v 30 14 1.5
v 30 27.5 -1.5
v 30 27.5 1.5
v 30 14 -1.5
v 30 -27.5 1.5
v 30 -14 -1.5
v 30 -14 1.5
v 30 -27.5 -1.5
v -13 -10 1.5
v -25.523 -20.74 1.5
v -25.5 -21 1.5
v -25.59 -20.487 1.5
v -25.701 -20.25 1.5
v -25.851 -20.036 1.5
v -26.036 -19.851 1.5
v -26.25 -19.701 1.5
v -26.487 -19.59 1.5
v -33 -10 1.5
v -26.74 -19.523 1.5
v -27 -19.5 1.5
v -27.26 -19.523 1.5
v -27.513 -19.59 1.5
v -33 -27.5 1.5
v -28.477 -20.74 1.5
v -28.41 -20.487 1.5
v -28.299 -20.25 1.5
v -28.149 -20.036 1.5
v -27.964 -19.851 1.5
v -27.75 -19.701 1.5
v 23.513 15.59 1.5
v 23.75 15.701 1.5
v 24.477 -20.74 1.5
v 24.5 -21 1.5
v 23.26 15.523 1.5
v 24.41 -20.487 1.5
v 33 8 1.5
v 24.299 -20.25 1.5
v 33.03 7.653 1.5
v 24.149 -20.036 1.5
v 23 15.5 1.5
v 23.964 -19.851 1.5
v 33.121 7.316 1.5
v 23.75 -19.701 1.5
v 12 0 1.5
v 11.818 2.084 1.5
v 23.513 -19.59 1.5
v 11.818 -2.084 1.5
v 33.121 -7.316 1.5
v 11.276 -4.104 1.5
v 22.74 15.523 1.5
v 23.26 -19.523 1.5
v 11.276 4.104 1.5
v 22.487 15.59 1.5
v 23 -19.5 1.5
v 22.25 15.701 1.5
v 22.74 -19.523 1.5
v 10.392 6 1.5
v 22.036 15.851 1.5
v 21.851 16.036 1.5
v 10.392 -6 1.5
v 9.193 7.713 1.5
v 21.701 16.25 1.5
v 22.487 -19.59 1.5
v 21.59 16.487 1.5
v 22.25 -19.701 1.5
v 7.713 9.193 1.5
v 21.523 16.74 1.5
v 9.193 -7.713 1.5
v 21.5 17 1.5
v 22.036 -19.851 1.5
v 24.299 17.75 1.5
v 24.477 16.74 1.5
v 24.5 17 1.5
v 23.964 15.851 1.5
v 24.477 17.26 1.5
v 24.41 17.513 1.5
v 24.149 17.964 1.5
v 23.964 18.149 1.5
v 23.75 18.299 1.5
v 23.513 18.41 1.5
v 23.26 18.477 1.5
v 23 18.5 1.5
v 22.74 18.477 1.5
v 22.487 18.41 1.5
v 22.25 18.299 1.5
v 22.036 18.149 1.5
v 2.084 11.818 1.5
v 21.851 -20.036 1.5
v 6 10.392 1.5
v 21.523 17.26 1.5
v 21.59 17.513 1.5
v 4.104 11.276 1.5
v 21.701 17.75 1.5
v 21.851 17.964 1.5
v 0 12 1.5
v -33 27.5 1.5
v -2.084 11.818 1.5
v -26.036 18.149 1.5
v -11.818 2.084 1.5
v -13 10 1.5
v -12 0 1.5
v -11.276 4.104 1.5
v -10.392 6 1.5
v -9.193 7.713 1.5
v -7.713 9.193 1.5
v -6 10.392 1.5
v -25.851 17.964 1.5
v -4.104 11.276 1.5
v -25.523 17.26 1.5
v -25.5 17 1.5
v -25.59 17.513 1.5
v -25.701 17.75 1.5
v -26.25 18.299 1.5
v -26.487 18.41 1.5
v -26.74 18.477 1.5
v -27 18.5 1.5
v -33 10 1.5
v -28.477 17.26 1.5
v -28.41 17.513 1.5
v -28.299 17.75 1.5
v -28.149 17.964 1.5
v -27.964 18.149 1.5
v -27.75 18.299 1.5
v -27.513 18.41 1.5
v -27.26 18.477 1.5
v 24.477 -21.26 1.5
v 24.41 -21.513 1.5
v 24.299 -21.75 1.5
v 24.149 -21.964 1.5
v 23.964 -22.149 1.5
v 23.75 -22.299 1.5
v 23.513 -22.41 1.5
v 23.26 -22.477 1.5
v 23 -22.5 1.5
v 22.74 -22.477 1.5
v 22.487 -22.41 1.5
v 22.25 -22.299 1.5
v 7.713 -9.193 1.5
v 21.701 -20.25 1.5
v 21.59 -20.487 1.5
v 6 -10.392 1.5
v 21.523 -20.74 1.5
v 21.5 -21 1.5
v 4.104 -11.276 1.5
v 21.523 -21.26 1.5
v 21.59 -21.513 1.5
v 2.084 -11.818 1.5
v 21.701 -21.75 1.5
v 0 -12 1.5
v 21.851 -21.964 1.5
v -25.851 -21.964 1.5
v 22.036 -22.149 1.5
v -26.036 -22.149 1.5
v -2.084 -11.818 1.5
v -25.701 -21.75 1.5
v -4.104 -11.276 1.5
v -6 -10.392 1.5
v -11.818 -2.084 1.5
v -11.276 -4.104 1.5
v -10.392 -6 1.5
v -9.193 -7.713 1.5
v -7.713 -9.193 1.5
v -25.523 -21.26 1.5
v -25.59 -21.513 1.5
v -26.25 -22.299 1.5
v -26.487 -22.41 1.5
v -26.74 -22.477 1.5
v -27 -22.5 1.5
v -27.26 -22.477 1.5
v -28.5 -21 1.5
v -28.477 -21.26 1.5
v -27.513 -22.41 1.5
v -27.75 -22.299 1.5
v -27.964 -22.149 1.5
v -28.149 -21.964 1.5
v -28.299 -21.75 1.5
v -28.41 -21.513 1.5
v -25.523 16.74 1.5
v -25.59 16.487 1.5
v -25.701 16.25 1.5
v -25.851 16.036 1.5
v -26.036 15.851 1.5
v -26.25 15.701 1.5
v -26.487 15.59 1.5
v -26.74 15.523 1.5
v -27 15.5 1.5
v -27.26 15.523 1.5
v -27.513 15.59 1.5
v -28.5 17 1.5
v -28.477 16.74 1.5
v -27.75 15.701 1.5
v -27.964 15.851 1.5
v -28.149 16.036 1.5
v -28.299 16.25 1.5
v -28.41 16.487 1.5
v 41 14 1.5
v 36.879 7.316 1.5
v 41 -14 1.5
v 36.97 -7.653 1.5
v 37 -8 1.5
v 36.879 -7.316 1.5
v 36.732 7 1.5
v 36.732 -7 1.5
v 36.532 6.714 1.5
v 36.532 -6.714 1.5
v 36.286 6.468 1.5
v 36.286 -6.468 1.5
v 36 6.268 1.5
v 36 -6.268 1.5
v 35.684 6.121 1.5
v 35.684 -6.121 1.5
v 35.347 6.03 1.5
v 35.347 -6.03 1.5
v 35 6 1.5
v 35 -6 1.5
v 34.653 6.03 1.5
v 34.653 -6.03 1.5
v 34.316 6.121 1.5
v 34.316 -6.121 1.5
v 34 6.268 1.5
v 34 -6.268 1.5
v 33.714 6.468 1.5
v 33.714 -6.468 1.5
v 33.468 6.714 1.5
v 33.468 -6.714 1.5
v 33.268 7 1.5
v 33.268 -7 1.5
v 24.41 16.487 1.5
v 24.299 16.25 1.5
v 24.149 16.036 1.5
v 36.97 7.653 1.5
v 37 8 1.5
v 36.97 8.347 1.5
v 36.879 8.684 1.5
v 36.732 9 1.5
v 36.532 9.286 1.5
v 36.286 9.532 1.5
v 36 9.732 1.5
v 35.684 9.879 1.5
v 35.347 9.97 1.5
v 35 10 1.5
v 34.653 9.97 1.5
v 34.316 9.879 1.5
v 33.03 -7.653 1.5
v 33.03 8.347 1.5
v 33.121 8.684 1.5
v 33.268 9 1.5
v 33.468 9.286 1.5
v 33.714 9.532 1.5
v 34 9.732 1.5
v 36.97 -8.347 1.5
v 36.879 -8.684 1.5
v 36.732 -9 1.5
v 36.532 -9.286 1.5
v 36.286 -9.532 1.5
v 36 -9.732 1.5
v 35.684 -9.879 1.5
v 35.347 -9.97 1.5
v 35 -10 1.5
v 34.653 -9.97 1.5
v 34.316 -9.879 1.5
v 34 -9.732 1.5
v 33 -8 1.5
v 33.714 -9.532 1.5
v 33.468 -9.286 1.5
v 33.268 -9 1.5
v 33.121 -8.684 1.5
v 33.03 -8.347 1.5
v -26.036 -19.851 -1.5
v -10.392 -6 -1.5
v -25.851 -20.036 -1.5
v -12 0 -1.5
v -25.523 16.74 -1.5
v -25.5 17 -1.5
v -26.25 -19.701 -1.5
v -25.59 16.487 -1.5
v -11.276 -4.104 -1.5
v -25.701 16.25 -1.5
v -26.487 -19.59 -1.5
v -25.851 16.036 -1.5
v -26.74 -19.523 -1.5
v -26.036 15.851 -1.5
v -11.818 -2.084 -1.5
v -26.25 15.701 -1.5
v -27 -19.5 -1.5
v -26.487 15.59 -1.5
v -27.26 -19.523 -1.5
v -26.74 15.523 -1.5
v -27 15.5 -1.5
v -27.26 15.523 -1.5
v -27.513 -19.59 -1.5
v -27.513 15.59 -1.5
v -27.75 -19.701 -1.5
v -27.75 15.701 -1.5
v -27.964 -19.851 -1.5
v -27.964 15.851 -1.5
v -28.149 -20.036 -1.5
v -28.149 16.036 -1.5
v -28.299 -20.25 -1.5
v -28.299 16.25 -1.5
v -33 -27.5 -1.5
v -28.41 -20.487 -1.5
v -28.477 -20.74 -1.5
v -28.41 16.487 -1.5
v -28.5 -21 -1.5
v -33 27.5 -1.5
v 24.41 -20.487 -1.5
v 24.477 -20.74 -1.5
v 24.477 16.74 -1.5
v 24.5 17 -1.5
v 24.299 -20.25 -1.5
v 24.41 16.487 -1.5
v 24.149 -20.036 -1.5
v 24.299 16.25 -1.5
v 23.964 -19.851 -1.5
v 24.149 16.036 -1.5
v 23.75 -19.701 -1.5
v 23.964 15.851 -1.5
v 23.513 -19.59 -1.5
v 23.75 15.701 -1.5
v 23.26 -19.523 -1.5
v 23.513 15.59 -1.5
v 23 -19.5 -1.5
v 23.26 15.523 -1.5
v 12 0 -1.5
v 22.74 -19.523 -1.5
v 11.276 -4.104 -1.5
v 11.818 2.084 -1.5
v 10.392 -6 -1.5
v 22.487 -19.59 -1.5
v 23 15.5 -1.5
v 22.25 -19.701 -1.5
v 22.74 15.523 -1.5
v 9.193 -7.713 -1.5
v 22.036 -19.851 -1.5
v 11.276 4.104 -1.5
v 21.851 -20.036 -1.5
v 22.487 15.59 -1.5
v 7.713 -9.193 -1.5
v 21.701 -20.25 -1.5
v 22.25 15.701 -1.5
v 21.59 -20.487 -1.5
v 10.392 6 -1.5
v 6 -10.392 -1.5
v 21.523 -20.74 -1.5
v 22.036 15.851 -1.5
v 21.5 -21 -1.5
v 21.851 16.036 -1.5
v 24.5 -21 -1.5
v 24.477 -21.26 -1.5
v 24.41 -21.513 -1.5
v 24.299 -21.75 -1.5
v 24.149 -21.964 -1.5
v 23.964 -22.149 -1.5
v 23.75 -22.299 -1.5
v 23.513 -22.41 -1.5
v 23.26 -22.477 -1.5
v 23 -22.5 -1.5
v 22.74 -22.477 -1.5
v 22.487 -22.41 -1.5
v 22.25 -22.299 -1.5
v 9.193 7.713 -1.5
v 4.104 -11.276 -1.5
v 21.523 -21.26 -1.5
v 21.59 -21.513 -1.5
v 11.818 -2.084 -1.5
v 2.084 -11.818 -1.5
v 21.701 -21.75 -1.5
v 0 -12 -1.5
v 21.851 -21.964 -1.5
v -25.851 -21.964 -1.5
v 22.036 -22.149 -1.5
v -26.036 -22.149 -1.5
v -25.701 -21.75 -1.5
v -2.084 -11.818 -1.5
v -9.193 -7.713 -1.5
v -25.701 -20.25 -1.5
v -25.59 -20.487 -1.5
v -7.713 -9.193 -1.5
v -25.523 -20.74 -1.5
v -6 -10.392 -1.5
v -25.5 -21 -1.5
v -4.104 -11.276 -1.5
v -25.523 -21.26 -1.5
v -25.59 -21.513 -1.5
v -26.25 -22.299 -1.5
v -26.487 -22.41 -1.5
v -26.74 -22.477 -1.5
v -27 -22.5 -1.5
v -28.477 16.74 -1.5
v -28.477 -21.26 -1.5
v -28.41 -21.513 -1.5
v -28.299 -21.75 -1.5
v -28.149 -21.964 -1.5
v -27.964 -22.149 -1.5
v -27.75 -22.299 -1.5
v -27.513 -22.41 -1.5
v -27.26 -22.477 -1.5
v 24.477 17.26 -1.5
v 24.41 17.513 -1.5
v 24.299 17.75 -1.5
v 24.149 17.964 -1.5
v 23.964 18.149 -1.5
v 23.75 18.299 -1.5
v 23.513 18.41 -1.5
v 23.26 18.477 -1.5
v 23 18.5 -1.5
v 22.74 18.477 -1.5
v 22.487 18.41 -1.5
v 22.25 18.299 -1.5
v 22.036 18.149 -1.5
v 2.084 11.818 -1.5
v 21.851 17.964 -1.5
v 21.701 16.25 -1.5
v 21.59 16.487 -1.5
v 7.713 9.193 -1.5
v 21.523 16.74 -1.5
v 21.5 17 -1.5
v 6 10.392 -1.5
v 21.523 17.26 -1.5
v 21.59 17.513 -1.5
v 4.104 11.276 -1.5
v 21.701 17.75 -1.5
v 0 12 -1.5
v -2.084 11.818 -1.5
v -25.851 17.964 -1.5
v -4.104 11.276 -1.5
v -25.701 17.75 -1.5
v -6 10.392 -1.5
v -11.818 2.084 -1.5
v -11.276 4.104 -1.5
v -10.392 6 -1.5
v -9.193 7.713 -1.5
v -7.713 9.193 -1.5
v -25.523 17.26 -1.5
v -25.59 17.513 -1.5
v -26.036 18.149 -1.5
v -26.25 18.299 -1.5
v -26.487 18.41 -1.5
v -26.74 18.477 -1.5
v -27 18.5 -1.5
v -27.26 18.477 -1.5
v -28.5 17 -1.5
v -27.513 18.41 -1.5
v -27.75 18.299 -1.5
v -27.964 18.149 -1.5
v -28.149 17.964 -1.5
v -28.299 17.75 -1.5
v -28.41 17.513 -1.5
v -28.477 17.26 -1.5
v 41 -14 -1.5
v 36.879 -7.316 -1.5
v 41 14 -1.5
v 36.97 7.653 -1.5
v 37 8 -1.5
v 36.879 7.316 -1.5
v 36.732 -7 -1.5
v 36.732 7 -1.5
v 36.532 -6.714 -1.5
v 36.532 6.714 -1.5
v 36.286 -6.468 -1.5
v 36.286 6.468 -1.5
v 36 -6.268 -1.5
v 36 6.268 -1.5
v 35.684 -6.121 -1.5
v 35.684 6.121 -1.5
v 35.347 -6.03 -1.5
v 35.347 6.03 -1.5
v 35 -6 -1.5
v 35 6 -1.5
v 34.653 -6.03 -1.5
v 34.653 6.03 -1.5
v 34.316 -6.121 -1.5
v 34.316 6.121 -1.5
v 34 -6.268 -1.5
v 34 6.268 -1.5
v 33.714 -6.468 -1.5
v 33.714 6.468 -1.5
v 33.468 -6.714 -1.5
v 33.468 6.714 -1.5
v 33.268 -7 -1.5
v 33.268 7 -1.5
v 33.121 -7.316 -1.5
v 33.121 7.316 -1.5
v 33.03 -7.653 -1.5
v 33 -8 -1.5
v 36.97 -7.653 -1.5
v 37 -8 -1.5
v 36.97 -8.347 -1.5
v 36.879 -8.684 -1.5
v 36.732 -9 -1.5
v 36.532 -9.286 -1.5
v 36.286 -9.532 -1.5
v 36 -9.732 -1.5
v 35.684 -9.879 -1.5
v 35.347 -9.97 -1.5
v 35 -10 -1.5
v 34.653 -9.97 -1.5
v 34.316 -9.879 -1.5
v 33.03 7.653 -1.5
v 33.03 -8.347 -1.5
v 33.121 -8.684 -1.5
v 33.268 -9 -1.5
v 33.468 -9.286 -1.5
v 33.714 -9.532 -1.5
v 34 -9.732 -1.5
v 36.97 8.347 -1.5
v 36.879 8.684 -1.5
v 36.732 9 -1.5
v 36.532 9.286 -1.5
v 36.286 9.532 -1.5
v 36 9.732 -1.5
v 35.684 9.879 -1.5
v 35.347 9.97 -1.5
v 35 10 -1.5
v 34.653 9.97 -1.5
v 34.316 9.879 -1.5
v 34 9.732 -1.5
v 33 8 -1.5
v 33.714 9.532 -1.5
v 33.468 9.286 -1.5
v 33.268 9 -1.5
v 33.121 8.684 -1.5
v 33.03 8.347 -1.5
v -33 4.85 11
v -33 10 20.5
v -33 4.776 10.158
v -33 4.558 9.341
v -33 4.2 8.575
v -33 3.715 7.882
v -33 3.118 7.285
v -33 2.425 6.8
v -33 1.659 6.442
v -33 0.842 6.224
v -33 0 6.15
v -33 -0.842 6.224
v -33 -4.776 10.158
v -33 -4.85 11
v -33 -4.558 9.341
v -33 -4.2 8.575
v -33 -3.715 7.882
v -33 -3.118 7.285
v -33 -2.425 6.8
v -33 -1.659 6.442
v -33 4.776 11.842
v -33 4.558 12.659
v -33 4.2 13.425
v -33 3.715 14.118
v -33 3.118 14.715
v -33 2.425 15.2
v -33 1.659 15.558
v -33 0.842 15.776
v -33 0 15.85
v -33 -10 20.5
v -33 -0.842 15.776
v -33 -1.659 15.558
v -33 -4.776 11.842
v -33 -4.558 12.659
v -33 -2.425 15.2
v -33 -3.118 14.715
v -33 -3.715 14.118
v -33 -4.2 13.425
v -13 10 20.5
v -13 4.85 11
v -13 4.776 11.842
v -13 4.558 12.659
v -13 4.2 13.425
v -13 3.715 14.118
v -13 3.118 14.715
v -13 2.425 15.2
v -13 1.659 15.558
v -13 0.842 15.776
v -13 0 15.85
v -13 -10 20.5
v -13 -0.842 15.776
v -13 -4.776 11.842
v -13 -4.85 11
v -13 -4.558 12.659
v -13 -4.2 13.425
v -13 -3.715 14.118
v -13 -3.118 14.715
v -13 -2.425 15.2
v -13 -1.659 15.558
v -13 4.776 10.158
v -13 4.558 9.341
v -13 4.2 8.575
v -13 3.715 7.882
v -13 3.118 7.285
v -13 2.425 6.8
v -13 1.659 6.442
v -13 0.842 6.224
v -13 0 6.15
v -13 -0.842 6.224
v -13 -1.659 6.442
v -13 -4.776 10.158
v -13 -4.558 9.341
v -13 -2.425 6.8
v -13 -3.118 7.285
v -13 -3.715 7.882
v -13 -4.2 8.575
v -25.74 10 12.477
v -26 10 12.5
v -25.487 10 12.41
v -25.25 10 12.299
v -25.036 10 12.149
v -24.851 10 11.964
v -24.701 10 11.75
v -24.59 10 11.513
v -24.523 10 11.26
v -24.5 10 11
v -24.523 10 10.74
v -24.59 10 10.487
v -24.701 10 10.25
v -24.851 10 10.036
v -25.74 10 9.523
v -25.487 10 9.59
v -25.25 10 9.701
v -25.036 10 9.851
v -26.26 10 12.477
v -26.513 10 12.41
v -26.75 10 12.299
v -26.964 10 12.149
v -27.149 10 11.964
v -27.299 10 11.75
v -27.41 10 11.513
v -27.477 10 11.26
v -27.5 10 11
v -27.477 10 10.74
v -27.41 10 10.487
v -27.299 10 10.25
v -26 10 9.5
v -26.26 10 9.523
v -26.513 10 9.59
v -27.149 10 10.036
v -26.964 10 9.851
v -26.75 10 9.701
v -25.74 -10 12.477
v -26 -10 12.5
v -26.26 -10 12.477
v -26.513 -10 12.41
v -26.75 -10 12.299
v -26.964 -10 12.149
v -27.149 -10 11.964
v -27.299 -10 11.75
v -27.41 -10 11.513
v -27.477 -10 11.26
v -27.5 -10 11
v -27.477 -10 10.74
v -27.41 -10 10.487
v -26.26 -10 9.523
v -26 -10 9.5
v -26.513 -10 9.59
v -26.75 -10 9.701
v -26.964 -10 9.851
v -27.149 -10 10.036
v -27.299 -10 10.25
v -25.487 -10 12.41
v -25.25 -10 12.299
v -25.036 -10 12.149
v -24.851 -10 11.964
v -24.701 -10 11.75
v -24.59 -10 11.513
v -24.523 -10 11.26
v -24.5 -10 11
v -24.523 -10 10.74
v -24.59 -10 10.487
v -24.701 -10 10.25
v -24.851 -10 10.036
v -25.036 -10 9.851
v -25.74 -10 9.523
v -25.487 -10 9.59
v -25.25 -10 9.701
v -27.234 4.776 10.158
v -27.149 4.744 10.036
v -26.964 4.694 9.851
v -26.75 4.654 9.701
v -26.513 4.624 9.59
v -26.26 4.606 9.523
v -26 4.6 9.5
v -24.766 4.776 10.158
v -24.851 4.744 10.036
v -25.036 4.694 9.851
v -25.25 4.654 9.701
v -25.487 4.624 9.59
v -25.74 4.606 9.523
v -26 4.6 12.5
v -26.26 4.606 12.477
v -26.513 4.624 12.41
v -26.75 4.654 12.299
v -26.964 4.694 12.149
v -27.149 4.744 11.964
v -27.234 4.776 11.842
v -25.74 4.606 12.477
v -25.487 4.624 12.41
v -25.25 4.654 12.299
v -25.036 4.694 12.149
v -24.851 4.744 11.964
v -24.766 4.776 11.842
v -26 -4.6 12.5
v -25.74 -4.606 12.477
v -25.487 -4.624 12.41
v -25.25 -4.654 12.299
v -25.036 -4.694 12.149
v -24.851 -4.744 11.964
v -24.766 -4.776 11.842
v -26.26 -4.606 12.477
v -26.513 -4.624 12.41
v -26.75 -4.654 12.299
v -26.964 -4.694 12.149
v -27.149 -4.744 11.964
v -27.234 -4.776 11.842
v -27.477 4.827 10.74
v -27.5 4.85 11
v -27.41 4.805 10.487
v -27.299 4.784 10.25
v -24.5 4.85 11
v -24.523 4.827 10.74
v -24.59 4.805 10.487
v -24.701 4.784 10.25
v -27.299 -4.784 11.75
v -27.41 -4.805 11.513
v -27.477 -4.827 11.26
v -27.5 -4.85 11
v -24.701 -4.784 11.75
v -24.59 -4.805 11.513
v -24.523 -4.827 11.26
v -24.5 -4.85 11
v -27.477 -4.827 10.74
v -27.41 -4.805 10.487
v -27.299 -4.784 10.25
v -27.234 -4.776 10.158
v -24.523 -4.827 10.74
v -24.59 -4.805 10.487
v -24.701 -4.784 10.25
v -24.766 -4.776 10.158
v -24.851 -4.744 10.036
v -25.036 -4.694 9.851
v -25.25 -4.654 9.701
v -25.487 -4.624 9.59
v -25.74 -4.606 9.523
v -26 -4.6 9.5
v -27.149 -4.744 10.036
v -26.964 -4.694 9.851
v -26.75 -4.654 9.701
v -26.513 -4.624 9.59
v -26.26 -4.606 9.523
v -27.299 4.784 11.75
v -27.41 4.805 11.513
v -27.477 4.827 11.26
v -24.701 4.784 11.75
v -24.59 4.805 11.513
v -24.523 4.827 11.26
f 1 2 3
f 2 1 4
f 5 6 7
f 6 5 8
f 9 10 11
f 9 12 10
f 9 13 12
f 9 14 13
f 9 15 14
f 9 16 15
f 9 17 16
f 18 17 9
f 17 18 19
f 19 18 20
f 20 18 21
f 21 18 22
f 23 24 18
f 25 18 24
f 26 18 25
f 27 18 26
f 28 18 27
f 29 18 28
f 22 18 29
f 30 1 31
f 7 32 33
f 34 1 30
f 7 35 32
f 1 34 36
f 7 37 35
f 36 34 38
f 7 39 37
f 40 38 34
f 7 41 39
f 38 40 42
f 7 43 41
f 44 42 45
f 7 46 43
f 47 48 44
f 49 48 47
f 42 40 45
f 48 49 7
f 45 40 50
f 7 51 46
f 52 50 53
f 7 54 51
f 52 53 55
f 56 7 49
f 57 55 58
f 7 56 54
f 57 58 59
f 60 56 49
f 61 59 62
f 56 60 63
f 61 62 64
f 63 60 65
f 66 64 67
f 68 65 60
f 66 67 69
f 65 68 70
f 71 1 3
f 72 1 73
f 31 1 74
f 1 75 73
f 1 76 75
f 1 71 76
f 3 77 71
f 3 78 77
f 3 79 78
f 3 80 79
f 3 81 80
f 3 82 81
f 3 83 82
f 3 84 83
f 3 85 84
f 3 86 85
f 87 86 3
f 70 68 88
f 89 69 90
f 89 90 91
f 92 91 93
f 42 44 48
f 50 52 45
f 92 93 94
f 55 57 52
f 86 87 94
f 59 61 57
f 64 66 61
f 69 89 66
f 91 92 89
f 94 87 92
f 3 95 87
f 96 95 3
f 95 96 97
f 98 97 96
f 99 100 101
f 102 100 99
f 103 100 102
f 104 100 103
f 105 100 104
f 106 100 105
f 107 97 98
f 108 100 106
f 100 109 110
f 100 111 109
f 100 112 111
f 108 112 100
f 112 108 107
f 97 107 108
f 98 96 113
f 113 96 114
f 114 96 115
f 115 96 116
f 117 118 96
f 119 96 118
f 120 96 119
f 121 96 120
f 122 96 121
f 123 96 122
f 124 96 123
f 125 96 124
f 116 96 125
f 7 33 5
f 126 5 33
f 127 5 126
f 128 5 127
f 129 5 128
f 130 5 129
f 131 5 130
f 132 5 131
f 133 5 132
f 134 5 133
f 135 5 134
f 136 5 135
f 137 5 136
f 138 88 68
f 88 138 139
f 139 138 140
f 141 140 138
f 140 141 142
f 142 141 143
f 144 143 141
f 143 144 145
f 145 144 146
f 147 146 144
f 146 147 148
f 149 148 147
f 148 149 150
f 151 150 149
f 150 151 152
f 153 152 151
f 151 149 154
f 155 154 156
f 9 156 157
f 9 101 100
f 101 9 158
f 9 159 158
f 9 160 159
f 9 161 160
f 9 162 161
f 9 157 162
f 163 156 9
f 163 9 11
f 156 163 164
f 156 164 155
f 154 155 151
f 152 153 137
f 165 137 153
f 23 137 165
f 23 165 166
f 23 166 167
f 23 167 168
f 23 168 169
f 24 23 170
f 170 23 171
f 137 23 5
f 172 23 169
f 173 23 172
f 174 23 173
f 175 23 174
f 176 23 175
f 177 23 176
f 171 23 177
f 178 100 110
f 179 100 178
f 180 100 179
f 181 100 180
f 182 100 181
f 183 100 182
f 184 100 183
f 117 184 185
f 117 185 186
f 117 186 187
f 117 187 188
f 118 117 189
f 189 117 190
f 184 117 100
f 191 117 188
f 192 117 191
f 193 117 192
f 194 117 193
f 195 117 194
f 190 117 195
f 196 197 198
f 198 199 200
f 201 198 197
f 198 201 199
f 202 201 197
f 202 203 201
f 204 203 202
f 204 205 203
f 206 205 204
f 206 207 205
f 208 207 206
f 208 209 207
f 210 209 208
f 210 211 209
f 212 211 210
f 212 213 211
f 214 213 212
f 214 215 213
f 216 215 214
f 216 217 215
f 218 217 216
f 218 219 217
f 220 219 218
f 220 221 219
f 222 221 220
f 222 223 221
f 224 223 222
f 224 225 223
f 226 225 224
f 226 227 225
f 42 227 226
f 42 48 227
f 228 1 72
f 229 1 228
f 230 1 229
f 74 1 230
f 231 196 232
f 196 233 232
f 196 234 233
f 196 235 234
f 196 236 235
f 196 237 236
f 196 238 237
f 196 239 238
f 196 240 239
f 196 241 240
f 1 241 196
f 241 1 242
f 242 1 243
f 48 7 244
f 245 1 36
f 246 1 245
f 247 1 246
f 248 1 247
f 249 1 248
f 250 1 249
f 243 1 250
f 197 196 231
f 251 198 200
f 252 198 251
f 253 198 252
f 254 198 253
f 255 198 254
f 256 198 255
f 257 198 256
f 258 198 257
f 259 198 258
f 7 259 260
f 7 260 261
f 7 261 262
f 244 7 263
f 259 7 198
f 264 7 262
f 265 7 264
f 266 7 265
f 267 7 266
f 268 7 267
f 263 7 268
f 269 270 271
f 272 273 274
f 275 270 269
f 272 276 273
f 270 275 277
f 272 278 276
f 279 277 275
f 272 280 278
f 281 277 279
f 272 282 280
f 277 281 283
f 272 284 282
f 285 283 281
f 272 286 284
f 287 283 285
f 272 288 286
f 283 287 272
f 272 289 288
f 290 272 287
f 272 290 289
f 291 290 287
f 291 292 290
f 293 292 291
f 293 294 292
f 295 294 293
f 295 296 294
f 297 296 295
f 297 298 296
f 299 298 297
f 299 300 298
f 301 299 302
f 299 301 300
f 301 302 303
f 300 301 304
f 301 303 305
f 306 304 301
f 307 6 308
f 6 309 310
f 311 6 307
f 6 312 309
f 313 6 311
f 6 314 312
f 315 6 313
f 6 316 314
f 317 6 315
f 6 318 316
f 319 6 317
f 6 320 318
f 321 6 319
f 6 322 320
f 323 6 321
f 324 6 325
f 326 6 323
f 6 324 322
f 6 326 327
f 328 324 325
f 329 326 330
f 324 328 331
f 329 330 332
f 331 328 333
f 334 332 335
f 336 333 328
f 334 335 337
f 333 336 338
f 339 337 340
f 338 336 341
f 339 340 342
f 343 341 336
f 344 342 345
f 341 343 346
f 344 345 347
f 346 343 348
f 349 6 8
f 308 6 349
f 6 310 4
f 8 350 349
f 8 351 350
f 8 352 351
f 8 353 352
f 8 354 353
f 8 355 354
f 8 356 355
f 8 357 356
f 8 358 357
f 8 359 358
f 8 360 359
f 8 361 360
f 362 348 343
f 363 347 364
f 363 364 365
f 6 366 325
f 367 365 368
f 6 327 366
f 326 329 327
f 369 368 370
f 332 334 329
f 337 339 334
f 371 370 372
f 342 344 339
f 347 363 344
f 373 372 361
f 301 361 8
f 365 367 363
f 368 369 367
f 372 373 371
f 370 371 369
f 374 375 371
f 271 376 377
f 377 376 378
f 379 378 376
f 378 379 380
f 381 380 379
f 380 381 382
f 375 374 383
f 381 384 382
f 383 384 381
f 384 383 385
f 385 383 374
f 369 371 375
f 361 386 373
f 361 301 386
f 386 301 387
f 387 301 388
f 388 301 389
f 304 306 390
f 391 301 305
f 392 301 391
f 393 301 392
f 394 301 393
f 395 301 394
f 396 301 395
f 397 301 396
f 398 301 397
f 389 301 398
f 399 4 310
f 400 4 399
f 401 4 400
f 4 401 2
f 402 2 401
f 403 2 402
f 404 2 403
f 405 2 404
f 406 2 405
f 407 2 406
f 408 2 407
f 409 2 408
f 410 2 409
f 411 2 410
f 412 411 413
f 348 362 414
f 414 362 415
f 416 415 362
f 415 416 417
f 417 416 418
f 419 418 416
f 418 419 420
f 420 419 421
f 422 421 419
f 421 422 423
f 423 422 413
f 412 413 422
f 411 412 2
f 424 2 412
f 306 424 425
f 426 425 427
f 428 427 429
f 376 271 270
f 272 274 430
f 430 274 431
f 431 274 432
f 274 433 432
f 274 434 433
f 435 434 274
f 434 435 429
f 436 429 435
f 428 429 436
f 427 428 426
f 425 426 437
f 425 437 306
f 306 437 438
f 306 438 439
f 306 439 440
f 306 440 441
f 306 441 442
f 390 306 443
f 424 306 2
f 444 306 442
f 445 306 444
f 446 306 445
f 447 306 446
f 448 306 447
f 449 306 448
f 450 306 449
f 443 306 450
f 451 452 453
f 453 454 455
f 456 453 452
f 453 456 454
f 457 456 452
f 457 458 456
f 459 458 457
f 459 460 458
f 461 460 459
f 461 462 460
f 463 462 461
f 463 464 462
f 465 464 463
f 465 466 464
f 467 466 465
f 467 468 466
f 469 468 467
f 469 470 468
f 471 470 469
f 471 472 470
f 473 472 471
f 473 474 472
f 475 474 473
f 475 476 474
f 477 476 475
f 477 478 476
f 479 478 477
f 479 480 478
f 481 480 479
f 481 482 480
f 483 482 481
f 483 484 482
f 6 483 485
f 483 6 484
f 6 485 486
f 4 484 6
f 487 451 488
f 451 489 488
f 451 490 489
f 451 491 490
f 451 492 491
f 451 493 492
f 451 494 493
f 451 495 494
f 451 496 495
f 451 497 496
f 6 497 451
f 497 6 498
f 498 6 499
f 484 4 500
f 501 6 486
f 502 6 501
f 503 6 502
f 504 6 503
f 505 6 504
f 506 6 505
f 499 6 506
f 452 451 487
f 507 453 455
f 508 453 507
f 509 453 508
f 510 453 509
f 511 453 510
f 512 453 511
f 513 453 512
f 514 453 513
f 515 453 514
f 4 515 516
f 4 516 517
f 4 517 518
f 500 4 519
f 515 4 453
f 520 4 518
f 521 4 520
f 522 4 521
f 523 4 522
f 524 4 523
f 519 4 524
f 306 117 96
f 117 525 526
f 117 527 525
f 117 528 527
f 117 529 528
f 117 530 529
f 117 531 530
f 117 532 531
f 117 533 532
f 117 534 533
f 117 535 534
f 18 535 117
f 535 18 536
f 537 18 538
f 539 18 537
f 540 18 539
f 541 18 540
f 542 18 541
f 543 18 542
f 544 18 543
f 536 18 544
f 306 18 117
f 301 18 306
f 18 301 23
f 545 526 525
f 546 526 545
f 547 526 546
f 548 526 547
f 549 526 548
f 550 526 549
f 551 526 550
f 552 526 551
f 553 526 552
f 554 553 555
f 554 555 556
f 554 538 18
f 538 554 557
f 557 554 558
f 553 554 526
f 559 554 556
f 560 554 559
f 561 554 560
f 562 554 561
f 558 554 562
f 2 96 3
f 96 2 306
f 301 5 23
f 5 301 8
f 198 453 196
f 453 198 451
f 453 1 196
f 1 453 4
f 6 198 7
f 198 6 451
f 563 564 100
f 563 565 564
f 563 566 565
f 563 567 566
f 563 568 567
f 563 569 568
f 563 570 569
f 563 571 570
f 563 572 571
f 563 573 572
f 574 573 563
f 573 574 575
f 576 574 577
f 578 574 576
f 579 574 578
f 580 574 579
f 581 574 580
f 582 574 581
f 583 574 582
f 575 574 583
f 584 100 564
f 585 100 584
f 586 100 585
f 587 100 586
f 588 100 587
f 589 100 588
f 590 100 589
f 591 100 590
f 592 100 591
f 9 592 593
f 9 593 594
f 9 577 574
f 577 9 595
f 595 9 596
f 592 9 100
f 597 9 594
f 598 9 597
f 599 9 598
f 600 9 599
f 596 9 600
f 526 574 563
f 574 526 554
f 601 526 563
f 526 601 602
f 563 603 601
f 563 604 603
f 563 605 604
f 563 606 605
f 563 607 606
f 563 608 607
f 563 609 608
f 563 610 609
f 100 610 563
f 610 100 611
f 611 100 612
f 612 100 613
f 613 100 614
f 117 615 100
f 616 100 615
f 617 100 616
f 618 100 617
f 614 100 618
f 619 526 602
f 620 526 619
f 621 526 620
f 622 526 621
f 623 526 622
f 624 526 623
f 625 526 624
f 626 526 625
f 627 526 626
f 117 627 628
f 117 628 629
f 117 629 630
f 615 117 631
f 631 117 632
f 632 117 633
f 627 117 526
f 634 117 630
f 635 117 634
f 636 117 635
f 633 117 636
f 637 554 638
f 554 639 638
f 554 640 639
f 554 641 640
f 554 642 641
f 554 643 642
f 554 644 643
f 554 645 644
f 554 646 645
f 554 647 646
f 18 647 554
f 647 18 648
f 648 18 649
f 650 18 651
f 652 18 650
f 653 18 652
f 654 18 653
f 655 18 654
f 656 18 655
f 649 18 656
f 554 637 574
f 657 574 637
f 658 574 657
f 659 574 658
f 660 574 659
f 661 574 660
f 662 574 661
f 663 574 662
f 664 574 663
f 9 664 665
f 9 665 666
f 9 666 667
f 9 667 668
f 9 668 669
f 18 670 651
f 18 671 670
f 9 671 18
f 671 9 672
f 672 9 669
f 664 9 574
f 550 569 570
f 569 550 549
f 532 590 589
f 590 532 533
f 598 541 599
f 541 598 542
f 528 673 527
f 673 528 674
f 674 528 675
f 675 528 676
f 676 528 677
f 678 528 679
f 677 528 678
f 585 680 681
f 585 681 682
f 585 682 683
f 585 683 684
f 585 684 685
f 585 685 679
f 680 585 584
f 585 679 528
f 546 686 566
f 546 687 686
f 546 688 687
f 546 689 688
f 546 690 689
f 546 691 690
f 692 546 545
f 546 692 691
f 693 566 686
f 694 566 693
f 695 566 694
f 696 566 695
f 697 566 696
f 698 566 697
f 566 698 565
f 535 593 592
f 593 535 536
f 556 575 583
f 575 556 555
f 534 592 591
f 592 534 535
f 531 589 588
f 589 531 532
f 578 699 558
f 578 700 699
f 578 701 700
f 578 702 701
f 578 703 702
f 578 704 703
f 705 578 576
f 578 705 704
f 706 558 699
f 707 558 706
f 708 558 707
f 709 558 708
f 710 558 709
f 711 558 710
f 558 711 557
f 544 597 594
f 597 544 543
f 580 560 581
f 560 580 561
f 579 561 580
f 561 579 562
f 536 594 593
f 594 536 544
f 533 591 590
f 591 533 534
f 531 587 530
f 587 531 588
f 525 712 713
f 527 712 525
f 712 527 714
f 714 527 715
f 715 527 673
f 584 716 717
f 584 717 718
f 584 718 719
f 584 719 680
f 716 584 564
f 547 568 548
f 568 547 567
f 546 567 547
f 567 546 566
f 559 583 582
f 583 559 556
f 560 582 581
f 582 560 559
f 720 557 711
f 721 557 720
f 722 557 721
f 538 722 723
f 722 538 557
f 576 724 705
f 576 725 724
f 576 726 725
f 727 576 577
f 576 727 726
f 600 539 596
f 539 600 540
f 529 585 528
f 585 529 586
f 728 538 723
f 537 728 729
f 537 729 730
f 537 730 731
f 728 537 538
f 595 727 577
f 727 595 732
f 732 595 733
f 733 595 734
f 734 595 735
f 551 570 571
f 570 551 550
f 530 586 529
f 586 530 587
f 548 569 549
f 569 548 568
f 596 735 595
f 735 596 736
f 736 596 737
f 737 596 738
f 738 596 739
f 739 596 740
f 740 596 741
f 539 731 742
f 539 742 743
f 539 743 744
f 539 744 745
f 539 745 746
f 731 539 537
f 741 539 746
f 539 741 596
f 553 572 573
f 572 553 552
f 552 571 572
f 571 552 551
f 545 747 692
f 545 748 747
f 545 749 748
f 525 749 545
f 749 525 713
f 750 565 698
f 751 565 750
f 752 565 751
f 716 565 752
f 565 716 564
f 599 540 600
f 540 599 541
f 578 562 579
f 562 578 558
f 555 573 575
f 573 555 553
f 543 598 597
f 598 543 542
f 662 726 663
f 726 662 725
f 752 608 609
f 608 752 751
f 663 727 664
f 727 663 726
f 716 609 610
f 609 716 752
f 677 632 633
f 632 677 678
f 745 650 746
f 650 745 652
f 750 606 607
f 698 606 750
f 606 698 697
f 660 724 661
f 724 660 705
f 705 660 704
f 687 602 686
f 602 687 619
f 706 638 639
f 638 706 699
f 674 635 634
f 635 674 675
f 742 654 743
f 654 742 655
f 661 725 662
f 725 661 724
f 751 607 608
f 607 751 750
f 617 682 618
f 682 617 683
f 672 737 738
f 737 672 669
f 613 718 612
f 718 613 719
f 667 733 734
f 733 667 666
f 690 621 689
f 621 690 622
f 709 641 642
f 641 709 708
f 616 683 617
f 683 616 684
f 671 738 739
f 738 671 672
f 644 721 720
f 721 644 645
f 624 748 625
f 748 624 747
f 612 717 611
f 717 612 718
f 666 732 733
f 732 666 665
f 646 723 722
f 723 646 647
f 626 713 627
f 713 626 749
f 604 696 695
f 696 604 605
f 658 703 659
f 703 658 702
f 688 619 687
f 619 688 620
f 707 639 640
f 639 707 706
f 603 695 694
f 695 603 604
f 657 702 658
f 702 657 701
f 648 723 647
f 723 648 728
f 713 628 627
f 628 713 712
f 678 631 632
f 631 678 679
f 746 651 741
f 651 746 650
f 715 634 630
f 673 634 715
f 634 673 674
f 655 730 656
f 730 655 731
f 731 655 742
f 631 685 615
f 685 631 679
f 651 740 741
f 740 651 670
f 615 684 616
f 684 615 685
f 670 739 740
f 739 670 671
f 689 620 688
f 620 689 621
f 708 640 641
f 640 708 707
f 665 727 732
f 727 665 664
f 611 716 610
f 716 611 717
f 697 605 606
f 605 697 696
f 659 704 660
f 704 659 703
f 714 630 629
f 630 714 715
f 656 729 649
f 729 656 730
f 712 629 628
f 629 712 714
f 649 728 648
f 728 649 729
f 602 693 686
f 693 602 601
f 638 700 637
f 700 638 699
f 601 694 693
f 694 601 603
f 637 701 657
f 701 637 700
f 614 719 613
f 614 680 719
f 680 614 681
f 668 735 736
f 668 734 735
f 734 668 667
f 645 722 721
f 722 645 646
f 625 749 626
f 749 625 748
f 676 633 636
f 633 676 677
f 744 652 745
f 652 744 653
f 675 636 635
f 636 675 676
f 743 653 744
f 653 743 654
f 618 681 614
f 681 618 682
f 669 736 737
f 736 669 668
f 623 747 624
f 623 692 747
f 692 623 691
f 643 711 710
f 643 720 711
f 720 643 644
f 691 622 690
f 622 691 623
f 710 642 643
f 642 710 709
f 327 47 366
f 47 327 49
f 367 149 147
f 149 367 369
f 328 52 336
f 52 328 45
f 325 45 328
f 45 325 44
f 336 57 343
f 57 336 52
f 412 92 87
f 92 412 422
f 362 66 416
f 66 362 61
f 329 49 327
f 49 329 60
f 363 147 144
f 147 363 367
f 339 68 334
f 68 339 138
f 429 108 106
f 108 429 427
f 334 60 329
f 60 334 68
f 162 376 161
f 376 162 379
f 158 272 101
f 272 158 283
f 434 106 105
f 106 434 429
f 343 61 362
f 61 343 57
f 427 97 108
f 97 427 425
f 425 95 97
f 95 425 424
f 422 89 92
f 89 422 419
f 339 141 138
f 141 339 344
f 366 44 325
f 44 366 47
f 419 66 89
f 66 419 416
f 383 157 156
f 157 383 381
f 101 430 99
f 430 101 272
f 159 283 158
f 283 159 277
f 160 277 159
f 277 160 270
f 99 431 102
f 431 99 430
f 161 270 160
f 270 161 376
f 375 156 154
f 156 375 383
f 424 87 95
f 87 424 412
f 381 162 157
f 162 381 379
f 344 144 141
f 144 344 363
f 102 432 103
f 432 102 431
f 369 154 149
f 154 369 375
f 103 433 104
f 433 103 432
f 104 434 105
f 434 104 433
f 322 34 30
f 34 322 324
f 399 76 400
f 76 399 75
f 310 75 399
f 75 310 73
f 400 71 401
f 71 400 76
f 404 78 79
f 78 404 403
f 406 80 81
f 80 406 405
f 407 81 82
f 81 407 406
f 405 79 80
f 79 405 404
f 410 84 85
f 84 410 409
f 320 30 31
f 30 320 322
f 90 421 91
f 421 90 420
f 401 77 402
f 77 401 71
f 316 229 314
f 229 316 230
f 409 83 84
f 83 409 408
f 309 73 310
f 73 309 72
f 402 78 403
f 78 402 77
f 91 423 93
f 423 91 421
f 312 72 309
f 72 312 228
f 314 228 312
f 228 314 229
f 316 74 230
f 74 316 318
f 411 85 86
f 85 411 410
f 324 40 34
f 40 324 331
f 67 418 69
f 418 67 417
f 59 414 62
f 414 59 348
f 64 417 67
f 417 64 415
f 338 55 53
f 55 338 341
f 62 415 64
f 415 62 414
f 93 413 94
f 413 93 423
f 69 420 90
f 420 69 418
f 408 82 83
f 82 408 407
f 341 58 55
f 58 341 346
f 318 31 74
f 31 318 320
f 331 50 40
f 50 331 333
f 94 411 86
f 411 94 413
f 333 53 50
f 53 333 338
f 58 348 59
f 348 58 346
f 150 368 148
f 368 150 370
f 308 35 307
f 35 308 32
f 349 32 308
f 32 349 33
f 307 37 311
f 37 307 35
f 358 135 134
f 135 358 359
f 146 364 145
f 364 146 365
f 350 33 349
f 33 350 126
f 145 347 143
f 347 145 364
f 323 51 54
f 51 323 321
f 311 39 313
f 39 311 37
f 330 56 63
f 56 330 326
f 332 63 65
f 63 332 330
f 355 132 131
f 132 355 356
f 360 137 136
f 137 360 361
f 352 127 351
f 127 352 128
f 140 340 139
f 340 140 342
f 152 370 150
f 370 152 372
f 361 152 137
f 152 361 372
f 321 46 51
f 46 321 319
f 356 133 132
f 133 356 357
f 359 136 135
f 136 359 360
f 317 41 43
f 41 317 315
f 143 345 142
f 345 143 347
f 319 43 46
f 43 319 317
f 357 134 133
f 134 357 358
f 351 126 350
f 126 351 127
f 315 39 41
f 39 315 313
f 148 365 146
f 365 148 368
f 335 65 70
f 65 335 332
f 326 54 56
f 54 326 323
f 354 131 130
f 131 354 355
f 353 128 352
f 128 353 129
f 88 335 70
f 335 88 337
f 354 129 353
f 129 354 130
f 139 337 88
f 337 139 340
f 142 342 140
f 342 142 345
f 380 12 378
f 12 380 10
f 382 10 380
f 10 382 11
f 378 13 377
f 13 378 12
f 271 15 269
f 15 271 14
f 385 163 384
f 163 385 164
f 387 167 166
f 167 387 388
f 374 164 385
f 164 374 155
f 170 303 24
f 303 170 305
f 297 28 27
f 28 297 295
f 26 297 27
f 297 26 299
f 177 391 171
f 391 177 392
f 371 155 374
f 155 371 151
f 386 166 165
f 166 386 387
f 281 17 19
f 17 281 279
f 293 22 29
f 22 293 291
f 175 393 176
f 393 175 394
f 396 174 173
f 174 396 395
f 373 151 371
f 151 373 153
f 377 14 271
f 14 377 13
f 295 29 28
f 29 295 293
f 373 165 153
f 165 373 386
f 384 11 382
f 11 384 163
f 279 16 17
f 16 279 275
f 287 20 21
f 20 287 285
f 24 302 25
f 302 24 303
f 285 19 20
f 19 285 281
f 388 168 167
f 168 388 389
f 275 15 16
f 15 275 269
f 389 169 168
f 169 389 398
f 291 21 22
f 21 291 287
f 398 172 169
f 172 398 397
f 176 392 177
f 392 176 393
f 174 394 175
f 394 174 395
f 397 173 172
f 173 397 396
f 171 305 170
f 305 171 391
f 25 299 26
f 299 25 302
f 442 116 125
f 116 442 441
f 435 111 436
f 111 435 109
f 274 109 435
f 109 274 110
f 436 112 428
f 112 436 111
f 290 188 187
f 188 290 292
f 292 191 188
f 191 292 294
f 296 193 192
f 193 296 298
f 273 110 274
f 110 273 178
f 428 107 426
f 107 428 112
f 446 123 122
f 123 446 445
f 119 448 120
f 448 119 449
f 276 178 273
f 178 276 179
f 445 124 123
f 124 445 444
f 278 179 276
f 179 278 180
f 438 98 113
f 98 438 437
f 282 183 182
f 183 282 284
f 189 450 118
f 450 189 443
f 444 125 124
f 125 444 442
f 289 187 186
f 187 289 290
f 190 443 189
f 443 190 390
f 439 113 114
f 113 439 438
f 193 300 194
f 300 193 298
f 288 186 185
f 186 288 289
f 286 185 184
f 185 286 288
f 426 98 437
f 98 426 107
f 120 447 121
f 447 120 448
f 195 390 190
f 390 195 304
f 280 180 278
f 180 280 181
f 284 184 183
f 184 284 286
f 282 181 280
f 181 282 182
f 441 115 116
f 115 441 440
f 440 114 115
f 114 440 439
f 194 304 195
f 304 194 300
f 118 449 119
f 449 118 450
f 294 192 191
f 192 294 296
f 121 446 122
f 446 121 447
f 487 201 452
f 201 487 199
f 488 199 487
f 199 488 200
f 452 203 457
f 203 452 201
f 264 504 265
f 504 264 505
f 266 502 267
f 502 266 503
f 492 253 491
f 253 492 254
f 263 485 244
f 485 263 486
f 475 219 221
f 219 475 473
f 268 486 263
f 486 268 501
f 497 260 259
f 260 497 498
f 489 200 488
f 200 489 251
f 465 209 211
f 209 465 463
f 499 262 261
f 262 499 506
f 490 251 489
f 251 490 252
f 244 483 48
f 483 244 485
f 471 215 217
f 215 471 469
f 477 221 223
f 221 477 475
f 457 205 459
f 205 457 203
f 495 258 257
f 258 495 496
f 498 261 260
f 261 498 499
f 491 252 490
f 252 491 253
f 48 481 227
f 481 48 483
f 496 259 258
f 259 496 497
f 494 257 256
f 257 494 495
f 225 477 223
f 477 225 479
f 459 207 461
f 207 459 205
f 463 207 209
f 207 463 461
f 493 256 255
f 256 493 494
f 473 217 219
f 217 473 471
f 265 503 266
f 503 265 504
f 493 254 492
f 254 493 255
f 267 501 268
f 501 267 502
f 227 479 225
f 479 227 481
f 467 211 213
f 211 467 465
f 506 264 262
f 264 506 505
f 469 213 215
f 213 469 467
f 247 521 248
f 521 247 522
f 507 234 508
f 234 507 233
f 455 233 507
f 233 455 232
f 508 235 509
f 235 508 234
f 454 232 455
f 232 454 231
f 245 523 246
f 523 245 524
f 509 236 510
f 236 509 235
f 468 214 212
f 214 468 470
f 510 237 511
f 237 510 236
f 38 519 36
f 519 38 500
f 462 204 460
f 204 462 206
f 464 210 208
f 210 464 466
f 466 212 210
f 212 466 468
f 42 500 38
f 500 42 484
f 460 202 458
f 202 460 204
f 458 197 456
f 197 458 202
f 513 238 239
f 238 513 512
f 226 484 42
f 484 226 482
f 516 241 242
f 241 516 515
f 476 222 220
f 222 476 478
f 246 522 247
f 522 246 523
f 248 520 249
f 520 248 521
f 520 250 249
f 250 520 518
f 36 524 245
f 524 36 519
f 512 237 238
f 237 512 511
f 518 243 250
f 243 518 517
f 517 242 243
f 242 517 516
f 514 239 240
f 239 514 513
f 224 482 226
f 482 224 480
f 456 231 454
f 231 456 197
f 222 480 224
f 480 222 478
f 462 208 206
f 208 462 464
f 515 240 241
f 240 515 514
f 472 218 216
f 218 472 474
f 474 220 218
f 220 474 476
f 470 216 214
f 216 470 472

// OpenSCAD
//sensor holder for Melexis Infrared thermometer in TO-39 metal can
// digi-Key part MLX90614ESF-BCI-000-TU-ND
//designed for pan and tilt 

$fn=36;

difference(){
union(){   
//baseplate    
translate([-1.5,0,0])cube([63,55,3], center=true);  
// extension for strain relief ties    
translate([4.5,0,0])cube([73,28,3], center=true);   
// cube for IRT    
translate([-23,0,20/2])cube([20,20,21], center=true);  

} 
union(){
//hole for IRT
translate([-20,0,11])rotate([0,90,0])cylinder(r = 9.7/2, h = 40, center=true);
//hole for M3 set screw    
translate([-26,-7.5,11])rotate([90,0,0]) cylinder(r = 1.5, h = 55, center=true);
//cutout
cylinder(r = 12, h = 6, center=true);   
// corner mounting holes on base plate    
translate([60/2-7,54/2-10,0])cylinder(h=4,r=3/2,center=true);
translate([60/2-7,-54/2+6,0])cylinder(h=4,r=3/2,center=true);  
translate([-54/2+0,-54/2+6,0])cylinder(h=4,r=3/2,center=true); 
translate([-54/2+0,+54/2-10,0])cylinder(h=4,r=3/2,center=true); 
//holes for zip tie strain relief 
translate([60/2+10/2,-8,0])cylinder(h=4,r=4/2,center=true); 
translate([60/2+10/2,8,0])cylinder(h=4,r=4/2,center=true);    
}
}
